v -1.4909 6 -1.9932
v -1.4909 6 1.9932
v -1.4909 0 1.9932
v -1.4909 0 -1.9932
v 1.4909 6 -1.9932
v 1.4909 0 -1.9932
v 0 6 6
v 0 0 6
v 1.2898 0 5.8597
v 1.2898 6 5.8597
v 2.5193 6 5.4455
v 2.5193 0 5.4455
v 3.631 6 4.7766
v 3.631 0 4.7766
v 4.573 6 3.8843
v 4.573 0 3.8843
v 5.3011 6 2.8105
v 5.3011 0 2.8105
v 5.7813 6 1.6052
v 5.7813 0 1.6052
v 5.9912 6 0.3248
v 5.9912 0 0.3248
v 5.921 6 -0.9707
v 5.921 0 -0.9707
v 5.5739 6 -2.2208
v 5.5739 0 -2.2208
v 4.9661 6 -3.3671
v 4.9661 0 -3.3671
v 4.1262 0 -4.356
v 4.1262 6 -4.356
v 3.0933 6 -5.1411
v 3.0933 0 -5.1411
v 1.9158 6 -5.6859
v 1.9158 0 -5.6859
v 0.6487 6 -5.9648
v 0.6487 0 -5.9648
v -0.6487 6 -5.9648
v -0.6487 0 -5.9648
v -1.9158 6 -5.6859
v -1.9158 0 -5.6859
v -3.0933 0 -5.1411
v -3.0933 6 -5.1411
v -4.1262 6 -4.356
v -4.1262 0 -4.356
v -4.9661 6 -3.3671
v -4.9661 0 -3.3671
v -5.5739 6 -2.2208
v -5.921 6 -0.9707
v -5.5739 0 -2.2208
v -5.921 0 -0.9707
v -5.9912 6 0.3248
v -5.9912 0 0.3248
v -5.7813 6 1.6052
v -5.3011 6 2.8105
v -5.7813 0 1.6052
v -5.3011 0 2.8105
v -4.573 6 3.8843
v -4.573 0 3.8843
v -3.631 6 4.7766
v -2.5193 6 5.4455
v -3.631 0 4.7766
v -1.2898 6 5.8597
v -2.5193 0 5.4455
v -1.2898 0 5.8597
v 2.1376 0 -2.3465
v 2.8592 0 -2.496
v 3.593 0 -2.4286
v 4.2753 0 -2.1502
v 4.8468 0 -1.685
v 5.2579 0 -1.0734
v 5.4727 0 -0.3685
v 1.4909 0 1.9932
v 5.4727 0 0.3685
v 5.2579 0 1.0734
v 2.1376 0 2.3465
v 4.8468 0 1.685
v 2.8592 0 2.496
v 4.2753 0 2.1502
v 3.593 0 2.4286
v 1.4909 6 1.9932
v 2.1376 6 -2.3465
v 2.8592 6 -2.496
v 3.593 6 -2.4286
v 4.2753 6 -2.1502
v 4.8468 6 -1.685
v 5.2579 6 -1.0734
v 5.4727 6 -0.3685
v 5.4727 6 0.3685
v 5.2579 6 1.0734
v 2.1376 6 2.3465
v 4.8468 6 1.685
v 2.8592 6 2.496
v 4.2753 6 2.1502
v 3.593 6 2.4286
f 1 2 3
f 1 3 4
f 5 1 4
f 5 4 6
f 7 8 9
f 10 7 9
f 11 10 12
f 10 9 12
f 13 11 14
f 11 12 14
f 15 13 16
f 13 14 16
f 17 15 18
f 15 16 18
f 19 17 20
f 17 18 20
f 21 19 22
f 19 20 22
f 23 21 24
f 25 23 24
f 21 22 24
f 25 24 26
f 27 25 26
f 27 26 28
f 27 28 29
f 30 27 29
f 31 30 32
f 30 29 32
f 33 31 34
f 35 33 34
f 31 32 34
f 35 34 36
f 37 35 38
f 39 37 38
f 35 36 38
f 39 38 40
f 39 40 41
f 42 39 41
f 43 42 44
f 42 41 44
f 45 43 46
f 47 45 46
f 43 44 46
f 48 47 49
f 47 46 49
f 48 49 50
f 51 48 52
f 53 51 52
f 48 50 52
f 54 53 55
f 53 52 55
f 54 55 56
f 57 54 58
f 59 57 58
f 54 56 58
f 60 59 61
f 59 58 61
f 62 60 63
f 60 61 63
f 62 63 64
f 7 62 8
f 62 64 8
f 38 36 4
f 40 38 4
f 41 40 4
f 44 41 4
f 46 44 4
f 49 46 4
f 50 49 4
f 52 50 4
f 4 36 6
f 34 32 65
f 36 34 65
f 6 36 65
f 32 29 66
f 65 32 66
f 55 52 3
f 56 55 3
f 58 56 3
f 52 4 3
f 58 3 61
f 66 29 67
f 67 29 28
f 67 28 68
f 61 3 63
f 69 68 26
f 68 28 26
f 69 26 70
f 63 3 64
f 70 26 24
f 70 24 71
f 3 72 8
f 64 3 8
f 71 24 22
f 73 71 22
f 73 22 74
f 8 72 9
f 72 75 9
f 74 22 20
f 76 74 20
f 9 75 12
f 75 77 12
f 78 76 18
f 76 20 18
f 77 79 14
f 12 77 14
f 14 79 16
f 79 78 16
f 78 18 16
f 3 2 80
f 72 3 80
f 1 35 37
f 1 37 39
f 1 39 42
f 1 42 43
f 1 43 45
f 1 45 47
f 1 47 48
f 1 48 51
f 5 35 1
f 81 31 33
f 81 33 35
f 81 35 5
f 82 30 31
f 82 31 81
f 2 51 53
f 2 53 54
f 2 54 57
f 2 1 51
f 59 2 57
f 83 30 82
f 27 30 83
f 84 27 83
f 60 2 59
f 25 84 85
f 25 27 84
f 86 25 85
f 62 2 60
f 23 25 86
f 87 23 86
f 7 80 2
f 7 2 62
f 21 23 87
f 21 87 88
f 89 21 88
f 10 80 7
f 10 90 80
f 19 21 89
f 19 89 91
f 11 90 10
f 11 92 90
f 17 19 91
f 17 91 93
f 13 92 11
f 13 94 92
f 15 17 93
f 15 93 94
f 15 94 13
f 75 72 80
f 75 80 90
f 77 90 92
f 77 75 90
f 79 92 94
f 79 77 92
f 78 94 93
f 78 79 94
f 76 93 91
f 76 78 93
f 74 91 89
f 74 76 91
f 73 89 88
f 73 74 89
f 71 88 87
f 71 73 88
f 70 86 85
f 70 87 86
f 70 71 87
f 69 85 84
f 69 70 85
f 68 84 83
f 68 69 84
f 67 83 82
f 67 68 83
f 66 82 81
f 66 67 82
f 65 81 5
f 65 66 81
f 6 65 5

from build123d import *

# Parameters (mm, degrees)
SKETCH_1_R          = 6
SKETCH_1_R_2        = 2.5
EXTRUDE_4_DEPTH     = 6
SKETCH_2_W          = 2.981877758
SKETCH_2_H          = 3.986343956
CUT_EXTRUDE_1_DEPTH = 10


with BuildPart() as part:
    # 草图1 → 凸台-拉伸4 (new body)
    with BuildSketch(Plane(origin=(0, 0, 0), x_dir=(1, 0, 0), z_dir=(0, 1, 0))):
        with Locations(Location((0, 0, 0), (0, 0, 270))):
            Circle(SKETCH_1_R)
        with Locations(Location((3, 0, 0), (0, 0, 270))):
            Circle(SKETCH_1_R_2, mode=Mode.SUBTRACT)
    extrude(amount=EXTRUDE_4_DEPTH)

    # 草图2 → 切除-拉伸1 (cut)
    with BuildSketch(Plane(origin=(0, 6, 0), x_dir=(1, 0, 0), z_dir=(0, 1, 0))):
        Rectangle(SKETCH_2_W, SKETCH_2_H)
    extrude(amount=-CUT_EXTRUDE_1_DEPTH, mode=Mode.SUBTRACT)


solid = part.part
